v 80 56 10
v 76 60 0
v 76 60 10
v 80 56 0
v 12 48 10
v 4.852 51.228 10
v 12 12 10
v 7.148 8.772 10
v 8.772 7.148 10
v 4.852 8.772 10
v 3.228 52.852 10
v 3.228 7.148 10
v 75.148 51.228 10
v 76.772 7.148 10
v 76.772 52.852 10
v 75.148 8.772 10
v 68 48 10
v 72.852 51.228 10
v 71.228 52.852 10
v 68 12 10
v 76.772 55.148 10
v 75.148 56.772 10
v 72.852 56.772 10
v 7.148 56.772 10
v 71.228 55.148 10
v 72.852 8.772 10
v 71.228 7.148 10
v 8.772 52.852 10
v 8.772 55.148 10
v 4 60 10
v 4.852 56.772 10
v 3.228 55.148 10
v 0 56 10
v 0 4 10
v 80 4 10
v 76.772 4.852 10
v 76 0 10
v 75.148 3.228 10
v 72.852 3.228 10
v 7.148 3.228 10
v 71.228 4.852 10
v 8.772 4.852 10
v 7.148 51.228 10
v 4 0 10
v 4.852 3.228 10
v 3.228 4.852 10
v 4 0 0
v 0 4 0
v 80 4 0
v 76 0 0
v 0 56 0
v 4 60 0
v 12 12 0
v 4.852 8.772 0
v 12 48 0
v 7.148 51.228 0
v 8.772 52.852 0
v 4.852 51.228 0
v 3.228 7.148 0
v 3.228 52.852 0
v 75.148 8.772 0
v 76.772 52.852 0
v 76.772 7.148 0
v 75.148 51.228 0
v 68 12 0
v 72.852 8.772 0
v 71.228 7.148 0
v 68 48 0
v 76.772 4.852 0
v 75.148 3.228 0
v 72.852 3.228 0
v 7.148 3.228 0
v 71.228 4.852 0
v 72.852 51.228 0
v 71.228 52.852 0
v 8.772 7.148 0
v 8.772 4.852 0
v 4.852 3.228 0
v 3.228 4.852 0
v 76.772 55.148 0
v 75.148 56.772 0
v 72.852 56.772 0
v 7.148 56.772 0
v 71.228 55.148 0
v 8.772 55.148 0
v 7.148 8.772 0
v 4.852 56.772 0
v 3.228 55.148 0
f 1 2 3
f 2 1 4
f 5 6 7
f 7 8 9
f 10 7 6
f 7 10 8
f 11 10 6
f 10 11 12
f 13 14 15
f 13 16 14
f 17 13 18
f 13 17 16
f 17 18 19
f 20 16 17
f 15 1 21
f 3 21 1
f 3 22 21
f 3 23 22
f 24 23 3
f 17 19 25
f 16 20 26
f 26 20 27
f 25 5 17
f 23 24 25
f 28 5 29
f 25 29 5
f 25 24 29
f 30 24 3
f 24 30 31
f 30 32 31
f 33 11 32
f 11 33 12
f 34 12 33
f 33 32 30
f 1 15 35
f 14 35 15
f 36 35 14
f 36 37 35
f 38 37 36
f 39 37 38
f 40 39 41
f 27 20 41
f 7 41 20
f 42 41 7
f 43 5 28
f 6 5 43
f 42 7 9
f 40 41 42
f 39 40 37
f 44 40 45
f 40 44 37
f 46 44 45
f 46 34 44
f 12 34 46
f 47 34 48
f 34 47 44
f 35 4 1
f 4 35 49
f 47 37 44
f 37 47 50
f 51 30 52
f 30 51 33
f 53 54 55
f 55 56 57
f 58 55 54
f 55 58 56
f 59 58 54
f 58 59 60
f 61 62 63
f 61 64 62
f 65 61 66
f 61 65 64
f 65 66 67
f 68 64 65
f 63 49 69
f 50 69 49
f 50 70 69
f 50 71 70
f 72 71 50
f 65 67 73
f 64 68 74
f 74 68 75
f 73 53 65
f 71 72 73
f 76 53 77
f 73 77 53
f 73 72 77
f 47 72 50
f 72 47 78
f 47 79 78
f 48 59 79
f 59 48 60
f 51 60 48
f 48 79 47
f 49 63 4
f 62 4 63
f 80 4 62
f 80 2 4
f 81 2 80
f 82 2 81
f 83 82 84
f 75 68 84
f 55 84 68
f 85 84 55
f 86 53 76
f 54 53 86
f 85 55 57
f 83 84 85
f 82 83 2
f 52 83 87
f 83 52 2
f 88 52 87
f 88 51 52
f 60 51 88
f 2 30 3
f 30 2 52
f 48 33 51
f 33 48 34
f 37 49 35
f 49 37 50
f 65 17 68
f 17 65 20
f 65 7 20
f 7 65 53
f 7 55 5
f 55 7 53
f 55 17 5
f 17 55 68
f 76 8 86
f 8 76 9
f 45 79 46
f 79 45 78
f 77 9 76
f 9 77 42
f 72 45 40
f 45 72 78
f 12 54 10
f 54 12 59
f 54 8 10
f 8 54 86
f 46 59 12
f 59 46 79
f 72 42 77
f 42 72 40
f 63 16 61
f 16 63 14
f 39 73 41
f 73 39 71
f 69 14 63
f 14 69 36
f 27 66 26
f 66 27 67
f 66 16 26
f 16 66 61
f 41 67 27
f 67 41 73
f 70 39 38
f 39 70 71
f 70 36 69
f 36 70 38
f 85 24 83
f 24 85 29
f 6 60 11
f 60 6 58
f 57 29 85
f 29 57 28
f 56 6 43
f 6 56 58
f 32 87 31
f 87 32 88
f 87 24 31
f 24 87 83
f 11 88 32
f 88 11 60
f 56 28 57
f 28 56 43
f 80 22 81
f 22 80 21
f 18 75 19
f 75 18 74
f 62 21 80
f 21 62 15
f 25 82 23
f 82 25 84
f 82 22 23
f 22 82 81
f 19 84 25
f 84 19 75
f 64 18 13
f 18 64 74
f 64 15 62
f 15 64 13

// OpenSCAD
$fn = 32;

// ----------------------------------------------------------------------
// Frame plate: 80 x 60 frame, 12 mm rails
// ----------------------------------------------------------------------

// --- parameters (mm) ---
plate_l = 80;             // plate length, X
plate_w = 60;             // plate width, Y
plate_t = 10;             // plate thickness, Z (extrusion height)
corner_c = 4;             // corner chamfer
frame_bar = 12;           // frame rail width
bolt_r = 3;               // corner bolt window radius
bolt_inset = 6;           // bolt centre inset from the edges

win_l = plate_l - 2 * frame_bar;  // window length
win_w = plate_w - 2 * frame_bar;  // window width
bolt_d = 2 * bolt_r;  // corner hole diameter

profile = [[4, 0], [76, 0], [80, 4], [80, 56], [76, 60], [4, 60], [0, 56], [0, 4]];  // primary outline, 8 points, counter clockwise
void_1 = [[12, 12], [68, 12], [68, 48], [12, 48]];  // the window, 4 points
void_2 = [[8.772, 7.148], [7.148, 8.772], [4.852, 8.772], [3.228, 7.148], [3.228, 4.852], [4.852, 3.228], [7.148, 3.228], [8.772, 4.852]];  // corner bolt window, 8 points
void_3 = [[76.772, 7.148], [75.148, 8.772], [72.852, 8.772], [71.228, 7.148], [71.228, 4.852], [72.852, 3.228], [75.148, 3.228], [76.772, 4.852]];  // corner bolt window, 8 points
void_4 = [[8.772, 55.148], [7.148, 56.772], [4.852, 56.772], [3.228, 55.148], [3.228, 52.852], [4.852, 51.228], [7.148, 51.228], [8.772, 52.852]];  // corner bolt window, 8 points
void_5 = [[76.772, 55.148], [75.148, 56.772], [72.852, 56.772], [71.228, 55.148], [71.228, 52.852], [72.852, 51.228], [75.148, 51.228], [76.772, 52.852]];  // corner bolt window, 8 points

// --- the one profile operation ---
difference() {
  linear_extrude(height = plate_t) polygon(points = profile);
  translate([0, 0, -1])
    linear_extrude(height = plate_t + 2) polygon(points = void_1);
  translate([0, 0, -1])
    linear_extrude(height = plate_t + 2) polygon(points = void_2);
  translate([0, 0, -1])
    linear_extrude(height = plate_t + 2) polygon(points = void_3);
  translate([0, 0, -1])
    linear_extrude(height = plate_t + 2) polygon(points = void_4);
  translate([0, 0, -1])
    linear_extrude(height = plate_t + 2) polygon(points = void_5);
}
